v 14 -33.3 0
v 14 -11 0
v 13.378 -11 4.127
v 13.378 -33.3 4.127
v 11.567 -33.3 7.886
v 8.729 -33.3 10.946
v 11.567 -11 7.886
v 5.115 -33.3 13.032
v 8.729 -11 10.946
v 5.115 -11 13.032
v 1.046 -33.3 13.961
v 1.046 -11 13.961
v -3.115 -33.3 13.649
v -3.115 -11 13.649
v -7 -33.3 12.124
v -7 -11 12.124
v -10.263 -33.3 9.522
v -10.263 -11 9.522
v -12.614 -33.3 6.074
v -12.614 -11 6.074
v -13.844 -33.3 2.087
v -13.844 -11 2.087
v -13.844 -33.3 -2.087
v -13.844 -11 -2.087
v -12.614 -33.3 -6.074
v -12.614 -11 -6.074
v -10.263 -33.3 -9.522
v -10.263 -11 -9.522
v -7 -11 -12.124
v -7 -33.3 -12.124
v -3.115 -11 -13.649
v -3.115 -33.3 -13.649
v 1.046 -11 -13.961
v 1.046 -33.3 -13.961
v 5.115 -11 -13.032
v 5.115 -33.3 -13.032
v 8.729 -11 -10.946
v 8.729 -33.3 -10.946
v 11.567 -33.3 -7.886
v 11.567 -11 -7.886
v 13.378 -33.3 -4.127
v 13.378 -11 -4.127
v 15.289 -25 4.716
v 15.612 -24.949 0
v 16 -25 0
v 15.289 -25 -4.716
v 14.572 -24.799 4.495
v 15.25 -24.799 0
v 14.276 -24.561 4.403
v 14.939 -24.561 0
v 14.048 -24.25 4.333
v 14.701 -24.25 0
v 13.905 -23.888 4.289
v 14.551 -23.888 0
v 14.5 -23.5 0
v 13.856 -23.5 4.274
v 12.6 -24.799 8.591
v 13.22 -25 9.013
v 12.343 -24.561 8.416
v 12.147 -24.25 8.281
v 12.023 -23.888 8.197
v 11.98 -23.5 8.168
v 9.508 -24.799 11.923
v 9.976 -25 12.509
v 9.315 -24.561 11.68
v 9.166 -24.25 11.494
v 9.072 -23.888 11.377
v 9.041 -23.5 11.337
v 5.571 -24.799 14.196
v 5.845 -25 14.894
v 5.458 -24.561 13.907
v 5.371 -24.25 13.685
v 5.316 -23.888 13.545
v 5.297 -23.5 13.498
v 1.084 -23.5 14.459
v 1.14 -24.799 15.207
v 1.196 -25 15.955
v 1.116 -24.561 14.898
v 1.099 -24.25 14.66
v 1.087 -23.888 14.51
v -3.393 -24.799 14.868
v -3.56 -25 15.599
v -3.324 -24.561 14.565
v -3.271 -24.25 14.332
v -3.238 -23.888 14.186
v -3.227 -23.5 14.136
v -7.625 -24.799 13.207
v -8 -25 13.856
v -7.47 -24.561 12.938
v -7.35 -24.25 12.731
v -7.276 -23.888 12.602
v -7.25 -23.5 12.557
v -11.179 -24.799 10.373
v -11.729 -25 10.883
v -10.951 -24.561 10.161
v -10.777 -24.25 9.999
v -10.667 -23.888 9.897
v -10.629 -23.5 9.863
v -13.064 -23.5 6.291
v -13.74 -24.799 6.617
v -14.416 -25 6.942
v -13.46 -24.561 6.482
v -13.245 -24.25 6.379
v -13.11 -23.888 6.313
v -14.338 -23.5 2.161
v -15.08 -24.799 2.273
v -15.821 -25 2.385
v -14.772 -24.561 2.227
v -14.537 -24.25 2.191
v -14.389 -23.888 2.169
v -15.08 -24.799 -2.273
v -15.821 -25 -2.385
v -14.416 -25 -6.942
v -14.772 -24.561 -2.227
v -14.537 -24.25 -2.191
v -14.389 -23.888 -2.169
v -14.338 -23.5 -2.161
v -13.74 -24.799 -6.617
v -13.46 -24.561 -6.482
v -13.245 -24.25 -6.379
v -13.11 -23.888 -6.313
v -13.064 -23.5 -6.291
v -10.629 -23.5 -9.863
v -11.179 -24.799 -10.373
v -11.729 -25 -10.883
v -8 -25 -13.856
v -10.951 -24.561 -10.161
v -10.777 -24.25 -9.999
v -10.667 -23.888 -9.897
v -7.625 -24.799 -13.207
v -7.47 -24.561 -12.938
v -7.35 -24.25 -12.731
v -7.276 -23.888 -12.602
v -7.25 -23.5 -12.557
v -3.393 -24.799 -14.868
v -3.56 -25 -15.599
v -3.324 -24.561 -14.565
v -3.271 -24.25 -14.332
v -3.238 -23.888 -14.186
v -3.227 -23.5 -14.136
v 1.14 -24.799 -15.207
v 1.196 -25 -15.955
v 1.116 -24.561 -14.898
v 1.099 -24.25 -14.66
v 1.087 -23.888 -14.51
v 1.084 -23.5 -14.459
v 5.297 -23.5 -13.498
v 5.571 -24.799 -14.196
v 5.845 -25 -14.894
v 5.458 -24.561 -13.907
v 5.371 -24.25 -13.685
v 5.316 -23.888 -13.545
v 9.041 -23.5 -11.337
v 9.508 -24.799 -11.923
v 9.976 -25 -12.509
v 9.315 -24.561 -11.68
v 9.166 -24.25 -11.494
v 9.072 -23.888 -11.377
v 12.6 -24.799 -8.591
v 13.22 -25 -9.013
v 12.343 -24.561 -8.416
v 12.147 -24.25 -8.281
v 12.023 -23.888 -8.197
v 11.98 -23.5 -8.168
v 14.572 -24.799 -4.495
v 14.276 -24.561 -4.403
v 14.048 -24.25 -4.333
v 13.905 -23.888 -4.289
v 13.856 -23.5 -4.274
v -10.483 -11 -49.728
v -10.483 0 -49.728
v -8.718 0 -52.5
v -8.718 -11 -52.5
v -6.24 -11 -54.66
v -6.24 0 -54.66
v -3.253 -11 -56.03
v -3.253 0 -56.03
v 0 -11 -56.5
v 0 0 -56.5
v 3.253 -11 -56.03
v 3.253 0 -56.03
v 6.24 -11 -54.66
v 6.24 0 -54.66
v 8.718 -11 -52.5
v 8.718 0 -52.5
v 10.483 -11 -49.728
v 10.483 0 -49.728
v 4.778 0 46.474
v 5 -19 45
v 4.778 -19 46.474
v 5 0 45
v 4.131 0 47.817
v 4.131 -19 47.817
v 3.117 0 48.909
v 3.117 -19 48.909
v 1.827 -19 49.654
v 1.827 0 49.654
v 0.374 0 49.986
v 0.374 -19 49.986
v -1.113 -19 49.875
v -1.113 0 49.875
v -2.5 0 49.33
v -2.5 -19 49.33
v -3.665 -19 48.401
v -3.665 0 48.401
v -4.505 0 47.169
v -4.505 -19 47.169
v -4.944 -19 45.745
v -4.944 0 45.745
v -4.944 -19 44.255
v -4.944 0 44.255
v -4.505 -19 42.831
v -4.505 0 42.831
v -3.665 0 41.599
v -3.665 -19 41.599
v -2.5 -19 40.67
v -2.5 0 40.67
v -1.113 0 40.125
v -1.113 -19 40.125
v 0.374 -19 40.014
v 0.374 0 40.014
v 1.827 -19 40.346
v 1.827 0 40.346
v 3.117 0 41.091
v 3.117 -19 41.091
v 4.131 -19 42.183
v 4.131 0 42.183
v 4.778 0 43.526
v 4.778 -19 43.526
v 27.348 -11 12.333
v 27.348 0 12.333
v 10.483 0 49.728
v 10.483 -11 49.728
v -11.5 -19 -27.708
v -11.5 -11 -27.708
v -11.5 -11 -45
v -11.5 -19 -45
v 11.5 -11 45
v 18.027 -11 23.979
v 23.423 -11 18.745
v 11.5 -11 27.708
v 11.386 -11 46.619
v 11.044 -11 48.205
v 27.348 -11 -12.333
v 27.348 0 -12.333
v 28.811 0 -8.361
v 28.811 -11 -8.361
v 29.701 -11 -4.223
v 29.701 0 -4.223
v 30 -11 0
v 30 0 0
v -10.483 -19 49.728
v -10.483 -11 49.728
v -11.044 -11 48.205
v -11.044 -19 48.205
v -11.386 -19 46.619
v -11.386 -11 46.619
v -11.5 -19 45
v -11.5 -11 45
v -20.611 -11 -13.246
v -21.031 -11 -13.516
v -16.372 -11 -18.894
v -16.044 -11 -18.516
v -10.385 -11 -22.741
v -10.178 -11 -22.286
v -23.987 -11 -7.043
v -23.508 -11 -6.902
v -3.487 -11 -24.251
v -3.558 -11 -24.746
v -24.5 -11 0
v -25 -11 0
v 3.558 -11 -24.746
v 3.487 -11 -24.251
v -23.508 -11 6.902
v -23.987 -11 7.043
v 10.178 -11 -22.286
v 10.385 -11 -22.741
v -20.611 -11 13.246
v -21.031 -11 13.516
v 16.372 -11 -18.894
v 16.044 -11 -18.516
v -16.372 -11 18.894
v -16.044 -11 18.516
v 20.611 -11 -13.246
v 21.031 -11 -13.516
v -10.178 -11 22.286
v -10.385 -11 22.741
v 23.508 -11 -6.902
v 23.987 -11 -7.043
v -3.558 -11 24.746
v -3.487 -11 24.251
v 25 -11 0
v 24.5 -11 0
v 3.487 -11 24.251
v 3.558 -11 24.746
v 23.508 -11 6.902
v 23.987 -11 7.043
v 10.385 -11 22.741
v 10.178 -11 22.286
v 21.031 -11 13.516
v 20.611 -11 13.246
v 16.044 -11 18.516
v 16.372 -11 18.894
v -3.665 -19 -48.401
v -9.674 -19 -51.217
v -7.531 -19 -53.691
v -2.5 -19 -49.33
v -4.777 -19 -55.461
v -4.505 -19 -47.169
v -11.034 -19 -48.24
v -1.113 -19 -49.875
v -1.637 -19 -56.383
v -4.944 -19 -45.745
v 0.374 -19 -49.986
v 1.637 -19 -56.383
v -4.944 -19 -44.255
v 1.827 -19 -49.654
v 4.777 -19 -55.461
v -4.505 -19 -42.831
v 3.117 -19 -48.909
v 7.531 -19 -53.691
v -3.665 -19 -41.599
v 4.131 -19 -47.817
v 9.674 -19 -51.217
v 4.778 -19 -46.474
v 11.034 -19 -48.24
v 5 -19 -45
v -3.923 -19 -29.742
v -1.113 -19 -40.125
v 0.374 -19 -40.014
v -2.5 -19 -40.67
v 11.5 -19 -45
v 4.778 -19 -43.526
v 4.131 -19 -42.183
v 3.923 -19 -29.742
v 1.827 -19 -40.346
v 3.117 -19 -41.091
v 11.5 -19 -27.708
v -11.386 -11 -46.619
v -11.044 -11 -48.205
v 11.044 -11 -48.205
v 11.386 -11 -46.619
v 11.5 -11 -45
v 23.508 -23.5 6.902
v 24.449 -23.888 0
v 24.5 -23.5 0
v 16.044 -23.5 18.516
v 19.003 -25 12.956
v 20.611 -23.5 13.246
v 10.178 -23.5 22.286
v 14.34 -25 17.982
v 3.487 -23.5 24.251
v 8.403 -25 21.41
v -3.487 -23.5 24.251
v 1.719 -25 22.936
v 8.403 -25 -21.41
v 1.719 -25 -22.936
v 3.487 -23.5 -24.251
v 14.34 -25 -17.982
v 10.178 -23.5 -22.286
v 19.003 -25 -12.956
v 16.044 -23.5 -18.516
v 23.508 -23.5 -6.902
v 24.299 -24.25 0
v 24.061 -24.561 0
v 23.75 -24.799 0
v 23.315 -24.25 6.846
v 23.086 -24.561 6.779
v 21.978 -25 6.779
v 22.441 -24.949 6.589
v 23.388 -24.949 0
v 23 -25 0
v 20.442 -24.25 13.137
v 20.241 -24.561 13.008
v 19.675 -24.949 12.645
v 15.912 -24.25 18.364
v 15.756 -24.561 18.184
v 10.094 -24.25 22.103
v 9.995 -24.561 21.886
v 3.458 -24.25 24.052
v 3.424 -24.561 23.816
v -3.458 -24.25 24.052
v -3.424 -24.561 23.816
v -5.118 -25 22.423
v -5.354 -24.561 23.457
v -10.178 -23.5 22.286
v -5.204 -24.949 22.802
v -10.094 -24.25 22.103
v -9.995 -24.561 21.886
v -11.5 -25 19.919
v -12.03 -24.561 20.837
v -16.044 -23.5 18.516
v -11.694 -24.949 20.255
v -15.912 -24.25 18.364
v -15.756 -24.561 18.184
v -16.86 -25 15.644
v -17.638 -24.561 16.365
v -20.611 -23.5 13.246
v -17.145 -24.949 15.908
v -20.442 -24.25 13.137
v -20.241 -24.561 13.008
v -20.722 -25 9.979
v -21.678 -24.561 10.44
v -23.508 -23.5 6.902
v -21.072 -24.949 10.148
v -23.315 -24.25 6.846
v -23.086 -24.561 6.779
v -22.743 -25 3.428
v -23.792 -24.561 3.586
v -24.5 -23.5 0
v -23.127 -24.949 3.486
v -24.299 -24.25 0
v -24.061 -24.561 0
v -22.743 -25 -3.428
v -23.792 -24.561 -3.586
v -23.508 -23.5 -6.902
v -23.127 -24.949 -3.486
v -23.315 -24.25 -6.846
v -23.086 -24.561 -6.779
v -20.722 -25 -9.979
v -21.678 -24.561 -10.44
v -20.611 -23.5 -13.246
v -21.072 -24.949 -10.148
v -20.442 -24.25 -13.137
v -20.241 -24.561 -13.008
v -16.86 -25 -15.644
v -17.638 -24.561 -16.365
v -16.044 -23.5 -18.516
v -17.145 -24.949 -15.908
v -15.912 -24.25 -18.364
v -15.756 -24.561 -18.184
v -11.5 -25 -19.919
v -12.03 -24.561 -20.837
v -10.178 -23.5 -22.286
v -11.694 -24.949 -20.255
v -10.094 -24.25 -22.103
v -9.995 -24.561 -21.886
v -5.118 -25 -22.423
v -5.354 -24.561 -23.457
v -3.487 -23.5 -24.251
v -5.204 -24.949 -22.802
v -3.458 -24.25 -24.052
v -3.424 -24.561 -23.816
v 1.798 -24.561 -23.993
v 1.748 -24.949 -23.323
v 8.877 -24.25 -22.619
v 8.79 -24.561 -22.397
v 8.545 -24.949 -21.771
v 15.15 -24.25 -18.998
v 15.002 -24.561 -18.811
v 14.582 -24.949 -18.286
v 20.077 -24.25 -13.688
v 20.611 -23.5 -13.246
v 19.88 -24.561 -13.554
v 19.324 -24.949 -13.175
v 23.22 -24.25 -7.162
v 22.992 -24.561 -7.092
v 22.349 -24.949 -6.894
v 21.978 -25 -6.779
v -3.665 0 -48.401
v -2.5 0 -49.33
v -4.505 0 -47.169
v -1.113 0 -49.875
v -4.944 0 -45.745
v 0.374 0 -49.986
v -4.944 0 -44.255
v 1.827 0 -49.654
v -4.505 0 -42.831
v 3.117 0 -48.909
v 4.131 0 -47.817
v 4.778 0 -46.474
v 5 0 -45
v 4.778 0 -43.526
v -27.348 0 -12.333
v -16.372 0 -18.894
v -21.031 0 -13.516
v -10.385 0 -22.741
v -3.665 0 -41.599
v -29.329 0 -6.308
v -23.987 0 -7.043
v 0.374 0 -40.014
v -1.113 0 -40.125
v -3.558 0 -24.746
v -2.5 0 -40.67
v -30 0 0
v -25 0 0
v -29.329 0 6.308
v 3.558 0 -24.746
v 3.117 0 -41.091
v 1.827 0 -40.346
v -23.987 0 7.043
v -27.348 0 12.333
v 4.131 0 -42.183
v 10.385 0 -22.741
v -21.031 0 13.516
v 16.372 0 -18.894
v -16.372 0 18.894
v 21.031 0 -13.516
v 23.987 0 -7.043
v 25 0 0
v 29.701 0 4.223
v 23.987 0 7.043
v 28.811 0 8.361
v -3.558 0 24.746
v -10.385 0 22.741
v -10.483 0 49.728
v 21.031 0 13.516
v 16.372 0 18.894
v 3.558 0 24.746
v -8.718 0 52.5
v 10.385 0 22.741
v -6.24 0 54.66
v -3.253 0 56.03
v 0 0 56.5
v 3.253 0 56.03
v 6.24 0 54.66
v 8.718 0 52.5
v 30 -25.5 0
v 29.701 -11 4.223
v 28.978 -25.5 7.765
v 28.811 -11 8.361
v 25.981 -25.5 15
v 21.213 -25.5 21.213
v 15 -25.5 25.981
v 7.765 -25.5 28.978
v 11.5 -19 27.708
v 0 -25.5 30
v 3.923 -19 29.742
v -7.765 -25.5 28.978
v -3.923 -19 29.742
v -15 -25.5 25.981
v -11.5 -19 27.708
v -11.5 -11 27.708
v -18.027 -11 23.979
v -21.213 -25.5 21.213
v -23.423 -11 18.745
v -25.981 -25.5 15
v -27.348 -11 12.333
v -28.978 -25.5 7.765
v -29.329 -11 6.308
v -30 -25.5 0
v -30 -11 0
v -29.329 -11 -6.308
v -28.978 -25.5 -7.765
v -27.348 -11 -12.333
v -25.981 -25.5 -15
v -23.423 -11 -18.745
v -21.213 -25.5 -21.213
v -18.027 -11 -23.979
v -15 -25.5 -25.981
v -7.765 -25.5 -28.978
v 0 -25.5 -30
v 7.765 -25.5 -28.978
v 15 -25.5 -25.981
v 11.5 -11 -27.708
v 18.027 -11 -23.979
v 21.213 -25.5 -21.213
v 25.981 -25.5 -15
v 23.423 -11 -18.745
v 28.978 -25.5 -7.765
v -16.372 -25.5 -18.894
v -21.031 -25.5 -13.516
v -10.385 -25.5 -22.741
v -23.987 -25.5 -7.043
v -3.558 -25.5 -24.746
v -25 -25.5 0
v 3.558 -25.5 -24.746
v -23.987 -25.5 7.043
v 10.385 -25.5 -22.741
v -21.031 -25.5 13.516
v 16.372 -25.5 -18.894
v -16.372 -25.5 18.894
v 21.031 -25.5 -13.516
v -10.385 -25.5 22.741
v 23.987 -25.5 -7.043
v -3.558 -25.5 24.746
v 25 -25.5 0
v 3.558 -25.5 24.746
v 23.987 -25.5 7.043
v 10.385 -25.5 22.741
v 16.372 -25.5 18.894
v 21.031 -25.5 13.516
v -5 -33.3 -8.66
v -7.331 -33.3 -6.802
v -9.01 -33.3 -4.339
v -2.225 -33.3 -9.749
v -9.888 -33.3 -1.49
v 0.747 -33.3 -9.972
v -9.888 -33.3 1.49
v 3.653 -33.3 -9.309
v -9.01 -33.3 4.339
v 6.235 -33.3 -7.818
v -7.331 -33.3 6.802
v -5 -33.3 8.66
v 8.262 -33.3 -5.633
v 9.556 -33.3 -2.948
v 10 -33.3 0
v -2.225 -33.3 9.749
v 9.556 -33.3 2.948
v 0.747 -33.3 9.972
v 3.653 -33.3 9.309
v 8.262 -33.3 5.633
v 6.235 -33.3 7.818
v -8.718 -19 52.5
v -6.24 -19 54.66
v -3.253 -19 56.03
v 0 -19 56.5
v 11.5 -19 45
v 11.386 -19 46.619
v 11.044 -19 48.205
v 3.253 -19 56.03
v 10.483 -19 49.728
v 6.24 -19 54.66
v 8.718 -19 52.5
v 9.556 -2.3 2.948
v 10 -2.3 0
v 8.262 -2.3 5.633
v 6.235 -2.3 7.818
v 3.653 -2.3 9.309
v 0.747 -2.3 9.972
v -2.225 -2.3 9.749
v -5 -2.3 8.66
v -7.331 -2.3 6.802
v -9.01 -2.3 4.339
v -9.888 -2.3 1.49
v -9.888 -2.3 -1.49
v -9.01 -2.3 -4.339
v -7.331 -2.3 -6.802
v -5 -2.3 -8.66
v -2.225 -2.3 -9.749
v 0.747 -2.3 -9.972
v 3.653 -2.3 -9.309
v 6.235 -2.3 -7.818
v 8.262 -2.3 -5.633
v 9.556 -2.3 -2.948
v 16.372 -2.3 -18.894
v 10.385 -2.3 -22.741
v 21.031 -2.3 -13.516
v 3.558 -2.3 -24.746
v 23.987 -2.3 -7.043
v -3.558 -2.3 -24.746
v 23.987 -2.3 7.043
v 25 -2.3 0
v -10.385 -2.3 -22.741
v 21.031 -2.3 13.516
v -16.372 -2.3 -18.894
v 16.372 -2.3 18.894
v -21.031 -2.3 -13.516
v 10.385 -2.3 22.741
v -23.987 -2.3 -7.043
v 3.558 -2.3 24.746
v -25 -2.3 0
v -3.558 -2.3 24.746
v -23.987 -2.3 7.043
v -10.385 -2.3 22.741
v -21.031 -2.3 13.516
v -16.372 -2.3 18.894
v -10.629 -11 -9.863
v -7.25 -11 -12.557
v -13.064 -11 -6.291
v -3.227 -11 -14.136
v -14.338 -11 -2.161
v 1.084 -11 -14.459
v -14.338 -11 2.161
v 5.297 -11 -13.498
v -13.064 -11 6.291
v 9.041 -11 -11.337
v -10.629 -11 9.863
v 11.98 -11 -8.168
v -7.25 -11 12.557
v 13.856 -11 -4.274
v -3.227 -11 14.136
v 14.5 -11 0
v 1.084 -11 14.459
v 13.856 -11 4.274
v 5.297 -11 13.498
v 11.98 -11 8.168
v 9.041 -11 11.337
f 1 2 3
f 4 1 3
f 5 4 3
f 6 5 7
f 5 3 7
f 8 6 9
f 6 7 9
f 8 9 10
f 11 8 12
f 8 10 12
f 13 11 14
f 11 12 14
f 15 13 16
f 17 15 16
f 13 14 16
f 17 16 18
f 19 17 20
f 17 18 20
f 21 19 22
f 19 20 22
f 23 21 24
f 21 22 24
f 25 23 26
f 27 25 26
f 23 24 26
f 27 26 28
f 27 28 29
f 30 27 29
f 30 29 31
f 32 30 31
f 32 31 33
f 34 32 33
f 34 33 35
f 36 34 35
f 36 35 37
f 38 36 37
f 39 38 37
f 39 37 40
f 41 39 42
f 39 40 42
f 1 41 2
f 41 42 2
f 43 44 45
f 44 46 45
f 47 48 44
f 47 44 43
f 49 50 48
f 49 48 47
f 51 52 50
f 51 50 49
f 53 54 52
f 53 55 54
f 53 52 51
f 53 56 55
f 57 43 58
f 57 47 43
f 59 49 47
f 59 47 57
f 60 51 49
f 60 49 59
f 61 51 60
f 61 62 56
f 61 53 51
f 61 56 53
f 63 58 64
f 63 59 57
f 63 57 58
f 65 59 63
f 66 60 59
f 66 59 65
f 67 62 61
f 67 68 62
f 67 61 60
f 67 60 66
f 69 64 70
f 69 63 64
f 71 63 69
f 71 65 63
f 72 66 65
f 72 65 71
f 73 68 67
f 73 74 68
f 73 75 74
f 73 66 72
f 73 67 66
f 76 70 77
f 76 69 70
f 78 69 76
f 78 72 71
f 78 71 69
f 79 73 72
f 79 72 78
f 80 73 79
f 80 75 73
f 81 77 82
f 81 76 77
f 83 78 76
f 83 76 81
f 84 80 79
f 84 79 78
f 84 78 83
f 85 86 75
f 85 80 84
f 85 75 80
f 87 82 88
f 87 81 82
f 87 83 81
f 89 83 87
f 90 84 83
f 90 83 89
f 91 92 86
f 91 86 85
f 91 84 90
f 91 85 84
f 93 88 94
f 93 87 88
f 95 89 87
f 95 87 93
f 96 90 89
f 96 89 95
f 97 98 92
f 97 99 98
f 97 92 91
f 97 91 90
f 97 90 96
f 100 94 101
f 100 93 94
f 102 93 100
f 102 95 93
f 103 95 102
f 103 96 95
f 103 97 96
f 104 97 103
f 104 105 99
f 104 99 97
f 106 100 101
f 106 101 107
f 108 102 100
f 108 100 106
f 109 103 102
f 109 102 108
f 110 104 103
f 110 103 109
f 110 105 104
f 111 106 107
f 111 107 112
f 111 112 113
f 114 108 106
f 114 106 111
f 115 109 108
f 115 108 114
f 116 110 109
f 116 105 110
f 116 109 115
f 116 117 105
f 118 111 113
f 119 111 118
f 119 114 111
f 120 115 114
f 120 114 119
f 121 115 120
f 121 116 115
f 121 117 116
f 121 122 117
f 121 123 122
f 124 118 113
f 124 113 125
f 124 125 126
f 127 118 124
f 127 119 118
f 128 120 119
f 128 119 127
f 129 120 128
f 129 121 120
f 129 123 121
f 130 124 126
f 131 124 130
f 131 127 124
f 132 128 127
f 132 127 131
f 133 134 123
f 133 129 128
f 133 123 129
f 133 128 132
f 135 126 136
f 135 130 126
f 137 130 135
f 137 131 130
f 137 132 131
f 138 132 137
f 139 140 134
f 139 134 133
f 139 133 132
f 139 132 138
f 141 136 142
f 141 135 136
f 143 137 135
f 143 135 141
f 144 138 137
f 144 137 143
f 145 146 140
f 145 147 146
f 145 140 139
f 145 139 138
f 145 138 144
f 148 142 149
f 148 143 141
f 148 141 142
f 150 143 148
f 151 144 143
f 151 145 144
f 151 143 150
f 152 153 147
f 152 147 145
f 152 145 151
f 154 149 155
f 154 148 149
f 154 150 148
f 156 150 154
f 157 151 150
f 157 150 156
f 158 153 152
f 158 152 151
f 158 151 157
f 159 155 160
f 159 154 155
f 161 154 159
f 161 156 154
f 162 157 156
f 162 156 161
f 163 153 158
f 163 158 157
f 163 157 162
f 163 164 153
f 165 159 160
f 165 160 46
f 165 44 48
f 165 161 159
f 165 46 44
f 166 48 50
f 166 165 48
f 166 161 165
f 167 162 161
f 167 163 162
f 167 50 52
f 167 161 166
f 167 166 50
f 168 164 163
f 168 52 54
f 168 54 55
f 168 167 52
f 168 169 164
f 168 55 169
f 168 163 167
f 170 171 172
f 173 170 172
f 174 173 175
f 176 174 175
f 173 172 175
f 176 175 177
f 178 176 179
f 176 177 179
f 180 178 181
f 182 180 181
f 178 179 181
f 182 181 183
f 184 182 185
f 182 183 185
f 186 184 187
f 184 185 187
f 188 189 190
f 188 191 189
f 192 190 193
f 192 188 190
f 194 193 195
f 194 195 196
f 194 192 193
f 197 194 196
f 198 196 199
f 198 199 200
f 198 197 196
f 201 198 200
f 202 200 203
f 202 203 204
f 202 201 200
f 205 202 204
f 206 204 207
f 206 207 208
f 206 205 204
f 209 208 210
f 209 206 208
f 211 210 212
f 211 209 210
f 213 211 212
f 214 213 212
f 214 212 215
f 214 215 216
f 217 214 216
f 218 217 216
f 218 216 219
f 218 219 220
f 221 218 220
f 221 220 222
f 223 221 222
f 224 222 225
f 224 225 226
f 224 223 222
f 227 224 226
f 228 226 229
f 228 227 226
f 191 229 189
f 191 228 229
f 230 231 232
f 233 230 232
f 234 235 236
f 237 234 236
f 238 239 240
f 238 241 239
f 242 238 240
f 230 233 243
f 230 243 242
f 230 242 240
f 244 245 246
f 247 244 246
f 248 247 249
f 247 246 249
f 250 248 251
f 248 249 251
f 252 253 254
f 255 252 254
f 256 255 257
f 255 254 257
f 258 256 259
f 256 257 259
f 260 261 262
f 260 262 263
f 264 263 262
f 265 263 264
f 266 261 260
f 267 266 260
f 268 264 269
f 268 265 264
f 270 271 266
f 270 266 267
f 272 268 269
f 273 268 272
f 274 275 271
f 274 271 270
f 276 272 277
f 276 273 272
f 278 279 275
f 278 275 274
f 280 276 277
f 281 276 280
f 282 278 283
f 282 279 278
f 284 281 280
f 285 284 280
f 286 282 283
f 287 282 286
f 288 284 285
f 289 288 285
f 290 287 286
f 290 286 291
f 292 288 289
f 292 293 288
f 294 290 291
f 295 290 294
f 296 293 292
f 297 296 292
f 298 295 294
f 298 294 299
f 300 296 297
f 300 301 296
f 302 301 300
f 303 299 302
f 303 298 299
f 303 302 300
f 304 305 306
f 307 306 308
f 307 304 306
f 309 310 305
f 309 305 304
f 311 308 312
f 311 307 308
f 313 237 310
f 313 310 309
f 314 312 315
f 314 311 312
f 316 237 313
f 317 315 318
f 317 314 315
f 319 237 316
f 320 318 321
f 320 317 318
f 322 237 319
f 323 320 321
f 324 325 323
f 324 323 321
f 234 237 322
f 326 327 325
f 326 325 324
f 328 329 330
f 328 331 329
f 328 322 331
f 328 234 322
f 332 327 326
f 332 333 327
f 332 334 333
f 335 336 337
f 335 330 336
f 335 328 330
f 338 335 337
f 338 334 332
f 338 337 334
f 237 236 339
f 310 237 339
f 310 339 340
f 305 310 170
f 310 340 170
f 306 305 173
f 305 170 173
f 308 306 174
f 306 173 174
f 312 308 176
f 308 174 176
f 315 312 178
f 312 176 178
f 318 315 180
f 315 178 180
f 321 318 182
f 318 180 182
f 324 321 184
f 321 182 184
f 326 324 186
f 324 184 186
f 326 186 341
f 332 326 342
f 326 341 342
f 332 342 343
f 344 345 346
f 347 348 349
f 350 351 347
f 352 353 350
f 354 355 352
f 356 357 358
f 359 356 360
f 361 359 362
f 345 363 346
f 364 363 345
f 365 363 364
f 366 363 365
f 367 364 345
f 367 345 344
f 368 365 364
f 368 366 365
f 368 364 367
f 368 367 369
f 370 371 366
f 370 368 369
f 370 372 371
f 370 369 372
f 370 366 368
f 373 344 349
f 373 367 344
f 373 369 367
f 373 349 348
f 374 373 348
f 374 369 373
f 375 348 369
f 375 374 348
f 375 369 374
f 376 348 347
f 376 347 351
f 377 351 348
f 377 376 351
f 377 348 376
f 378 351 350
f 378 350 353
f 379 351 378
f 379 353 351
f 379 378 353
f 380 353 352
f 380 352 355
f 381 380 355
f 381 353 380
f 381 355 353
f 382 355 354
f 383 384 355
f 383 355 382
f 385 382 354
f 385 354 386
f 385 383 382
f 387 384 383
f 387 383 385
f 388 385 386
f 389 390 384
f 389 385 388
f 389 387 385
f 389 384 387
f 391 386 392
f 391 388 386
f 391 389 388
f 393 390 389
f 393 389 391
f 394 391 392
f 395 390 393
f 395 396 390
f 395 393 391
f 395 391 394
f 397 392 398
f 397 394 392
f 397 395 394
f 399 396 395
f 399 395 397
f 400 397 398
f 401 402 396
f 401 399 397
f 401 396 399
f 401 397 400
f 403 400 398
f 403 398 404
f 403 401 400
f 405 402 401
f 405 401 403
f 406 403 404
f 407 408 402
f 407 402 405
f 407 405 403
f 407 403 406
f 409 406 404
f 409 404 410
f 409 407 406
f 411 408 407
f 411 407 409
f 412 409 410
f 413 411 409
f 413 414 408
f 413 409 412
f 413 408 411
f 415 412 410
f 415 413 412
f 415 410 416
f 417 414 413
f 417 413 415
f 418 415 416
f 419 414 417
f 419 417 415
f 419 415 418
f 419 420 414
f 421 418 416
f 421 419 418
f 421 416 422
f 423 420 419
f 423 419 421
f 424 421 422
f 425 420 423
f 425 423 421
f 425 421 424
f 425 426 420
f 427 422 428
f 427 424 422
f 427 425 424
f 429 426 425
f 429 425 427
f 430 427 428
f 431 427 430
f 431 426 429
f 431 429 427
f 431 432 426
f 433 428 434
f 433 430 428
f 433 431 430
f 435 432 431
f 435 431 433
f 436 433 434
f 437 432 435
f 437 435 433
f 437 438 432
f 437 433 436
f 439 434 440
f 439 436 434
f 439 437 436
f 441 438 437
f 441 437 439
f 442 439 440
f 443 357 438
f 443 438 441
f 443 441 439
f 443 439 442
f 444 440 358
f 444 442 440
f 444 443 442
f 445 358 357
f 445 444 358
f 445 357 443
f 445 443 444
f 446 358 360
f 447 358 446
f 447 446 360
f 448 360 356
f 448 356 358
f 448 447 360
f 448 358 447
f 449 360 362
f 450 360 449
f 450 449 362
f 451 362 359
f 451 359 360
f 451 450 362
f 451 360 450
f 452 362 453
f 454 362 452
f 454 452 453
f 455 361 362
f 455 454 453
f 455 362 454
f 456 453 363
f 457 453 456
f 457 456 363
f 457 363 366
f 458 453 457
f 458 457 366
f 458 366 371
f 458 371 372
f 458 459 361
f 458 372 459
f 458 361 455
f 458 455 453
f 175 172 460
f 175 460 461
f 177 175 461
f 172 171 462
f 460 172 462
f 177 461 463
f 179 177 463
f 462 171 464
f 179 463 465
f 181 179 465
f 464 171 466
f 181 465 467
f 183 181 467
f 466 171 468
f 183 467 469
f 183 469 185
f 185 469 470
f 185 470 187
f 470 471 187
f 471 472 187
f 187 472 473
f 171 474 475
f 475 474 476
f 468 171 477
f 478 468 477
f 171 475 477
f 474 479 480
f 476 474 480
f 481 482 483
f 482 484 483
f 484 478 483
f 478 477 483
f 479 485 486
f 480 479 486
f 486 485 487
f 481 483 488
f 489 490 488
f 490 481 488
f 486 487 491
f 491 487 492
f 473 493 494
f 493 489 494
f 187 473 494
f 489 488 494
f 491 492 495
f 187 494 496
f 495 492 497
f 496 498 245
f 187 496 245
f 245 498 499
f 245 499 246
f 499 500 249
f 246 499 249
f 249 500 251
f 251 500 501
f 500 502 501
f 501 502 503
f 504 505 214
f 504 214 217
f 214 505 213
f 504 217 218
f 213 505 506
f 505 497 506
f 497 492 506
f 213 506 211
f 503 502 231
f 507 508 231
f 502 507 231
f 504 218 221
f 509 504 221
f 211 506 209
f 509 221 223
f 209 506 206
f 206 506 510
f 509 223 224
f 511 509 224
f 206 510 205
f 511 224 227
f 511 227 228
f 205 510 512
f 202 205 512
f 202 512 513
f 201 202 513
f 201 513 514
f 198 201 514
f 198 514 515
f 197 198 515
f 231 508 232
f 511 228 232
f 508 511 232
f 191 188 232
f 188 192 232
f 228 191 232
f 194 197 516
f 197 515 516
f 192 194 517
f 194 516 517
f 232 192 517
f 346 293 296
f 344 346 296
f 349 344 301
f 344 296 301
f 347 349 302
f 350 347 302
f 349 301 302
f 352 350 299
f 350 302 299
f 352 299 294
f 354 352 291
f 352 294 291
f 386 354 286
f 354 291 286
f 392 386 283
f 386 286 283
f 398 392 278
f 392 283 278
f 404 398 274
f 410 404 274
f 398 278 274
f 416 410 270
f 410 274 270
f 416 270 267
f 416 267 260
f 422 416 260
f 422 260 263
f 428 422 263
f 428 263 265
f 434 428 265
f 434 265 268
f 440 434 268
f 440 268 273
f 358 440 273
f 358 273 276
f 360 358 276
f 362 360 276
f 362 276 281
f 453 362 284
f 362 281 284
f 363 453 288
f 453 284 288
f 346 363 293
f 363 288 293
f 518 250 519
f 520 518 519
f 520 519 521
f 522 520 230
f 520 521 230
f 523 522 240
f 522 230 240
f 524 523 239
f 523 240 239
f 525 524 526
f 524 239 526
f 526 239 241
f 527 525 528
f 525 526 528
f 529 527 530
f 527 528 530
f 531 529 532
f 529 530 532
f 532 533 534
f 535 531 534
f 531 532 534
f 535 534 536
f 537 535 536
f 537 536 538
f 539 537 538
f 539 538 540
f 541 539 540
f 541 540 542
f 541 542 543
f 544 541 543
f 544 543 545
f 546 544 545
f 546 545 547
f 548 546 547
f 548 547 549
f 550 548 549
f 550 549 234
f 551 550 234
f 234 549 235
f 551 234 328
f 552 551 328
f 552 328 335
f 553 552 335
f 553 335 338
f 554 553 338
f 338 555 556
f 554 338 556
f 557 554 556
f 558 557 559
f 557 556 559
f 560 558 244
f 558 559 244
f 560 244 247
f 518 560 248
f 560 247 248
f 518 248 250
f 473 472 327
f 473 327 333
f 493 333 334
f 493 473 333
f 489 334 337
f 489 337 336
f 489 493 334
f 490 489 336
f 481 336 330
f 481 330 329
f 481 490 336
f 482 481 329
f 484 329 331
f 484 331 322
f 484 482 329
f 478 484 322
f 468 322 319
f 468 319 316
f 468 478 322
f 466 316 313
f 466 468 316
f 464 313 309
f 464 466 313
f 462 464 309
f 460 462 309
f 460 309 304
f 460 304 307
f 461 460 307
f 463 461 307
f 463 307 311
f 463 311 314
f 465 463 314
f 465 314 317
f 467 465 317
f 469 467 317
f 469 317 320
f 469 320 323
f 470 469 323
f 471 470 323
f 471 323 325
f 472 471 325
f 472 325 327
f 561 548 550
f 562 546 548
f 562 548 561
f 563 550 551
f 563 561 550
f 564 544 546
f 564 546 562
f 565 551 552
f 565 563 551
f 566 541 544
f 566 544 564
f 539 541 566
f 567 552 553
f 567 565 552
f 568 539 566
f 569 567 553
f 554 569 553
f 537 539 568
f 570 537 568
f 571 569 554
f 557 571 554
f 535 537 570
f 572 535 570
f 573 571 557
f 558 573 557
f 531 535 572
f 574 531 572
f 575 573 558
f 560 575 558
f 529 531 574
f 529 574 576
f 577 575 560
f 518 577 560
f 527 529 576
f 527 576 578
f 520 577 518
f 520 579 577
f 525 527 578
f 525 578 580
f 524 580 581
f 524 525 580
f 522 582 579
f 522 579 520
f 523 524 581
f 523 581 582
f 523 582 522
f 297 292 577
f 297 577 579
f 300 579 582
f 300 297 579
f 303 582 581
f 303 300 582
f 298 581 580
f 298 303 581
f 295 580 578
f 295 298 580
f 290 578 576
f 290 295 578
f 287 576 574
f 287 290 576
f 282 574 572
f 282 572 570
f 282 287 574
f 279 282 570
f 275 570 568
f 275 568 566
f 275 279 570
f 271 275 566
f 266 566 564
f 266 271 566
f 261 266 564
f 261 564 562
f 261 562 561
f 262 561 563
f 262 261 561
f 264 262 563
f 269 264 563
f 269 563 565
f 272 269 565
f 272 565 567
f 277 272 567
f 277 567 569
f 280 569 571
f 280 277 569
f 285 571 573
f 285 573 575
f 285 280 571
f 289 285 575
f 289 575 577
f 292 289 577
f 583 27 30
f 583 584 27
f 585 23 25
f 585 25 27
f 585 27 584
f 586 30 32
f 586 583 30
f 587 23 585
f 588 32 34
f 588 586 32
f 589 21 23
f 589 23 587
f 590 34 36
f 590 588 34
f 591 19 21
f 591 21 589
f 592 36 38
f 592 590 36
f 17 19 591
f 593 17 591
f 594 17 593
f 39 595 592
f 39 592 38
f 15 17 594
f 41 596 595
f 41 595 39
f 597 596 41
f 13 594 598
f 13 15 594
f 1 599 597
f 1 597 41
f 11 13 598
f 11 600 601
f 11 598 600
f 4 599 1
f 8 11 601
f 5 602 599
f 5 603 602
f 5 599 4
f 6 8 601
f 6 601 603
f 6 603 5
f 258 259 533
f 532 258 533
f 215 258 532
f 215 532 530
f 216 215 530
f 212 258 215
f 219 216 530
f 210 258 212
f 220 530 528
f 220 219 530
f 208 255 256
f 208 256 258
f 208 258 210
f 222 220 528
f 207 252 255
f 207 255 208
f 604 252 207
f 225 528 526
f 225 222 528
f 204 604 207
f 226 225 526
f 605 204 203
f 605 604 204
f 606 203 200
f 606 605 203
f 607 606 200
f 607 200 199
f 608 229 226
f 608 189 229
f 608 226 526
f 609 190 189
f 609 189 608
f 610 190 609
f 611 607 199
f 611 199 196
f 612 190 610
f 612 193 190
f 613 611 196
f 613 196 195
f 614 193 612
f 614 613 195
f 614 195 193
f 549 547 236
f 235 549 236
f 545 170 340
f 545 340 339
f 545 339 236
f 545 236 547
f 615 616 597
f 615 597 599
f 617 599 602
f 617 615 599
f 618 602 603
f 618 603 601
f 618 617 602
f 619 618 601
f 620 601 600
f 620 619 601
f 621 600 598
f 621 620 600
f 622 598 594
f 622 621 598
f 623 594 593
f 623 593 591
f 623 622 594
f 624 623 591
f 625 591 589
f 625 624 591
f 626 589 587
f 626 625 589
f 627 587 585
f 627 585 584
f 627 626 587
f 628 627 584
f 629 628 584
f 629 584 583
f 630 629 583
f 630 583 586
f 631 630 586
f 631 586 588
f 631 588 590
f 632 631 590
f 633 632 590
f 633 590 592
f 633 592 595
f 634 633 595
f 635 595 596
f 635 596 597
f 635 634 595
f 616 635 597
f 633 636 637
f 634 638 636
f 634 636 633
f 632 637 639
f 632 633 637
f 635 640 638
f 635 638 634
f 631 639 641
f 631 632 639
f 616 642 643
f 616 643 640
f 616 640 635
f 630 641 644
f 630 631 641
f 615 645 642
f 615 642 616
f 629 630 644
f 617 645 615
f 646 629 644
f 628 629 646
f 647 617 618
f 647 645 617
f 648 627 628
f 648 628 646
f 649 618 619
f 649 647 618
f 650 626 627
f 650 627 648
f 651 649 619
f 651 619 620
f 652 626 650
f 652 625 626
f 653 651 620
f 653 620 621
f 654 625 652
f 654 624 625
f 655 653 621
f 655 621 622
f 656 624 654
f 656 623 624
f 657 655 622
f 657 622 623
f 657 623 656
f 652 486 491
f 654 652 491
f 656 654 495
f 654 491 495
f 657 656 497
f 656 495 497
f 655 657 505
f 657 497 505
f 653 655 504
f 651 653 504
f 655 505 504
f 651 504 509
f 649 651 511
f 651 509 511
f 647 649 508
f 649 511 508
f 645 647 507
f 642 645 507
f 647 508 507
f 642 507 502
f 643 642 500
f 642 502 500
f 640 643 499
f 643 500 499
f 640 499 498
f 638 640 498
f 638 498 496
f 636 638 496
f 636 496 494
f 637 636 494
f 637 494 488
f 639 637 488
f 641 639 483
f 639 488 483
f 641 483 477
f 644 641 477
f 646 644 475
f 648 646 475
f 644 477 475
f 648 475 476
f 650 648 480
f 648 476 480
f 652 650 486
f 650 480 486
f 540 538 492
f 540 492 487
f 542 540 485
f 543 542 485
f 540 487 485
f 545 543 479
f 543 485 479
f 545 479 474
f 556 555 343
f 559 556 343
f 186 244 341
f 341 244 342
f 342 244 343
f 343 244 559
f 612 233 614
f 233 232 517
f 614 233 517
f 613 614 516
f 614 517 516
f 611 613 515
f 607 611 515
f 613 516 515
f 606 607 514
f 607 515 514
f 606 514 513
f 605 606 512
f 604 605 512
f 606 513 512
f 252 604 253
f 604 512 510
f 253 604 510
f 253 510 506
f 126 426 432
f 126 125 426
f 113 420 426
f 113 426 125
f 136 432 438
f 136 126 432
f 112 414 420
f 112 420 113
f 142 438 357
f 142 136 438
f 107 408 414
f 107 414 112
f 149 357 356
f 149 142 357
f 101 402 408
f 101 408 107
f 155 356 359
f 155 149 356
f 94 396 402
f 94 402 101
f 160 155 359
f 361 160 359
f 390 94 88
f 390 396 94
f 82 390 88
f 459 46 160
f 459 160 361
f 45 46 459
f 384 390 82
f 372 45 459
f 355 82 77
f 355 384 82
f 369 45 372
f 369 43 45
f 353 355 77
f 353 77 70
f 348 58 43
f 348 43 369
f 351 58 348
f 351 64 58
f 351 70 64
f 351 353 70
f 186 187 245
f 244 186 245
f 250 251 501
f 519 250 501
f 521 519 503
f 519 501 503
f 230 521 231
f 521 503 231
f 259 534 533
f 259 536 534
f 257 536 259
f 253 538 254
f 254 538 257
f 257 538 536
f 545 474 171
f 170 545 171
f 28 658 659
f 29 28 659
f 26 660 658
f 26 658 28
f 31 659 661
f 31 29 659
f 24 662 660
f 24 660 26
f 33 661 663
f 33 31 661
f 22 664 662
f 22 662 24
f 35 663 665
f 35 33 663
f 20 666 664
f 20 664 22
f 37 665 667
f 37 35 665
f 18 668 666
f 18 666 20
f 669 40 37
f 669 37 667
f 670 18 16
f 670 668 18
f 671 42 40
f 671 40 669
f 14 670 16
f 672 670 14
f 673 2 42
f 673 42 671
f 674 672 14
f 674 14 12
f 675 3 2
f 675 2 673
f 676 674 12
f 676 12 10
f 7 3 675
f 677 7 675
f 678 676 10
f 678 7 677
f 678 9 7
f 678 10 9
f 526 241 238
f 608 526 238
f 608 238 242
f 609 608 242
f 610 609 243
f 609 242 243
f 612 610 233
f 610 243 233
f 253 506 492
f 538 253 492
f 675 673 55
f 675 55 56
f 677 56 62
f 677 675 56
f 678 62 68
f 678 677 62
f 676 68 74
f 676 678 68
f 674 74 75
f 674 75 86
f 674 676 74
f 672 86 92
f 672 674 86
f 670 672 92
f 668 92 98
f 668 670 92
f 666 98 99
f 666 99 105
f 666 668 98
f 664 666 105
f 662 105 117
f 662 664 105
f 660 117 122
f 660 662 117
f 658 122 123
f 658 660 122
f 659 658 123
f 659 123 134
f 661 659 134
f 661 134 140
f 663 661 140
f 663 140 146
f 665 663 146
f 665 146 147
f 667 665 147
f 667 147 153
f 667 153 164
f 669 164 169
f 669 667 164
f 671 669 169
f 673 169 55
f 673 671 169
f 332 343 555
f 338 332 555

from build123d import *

# Parameters (mm, degrees)
F0_R      = 5
F0_R_2    = 10
F1_DEPTH  = 11
F2_R      = 14
F2_R_2    = 10
F3_DEPTH  = 22.3
F4_R      = 30
F4_R_2    = 25
F5_DEPTH  = 14.5
F6_R      = 5
F7_DEPTH  = 8
F8_R      = 25
F8_R_2    = 10
F9_DEPTH  = 2.3
F10_R     = 24.5
F10_R_2   = 14.5
F11_DEPTH = 14
F12_R     = 1.5


with BuildPart() as f1:
    # F0 (on Front) → F1 (new body)
    with BuildSketch(Plane.XZ):
        with BuildLine():
            ThreePointArc((-10.48323, 49.727778), (-2.417938, 33.757066), (11.5, 45))
            ThreePointArc((11.5, 45), (11.242934, 47.417938), (10.48323, 49.727778))
            ThreePointArc((10.48323, 49.727778), (0, 56.5), (-10.48323, 49.727778))
        make_face()
        with Locations((0, 45)):
            Circle(F0_R, mode=Mode.SUBTRACT)
        with BuildLine():
            ThreePointArc((10.48323, 49.727778), (11.242934, 47.417938), (11.5, 45))
            ThreePointArc((11.5, 45), (-2.417938, 33.757066), (-10.48323, 49.727778))
            Line((-10.48323, 49.727778), (-27.347557, 12.333333))
            ThreePointArc((-27.347557, 12.333333), (0, 30), (27.347557, 12.333333))
            Line((27.347557, 12.333333), (10.48323, 49.727778))
        make_face()
        with BuildLine():
            ThreePointArc((30, 0), (29.329394, 6.307665), (27.347557, 12.333333))
            ThreePointArc((27.347557, 12.333333), (0, 30), (-27.347557, 12.333333))
            ThreePointArc((-27.347557, 12.333333), (-30, 0), (-27.347557, -12.333333))
            ThreePointArc((-27.347557, -12.333333), (0, -30), (27.347557, -12.333333))
            ThreePointArc((27.347557, -12.333333), (29.329394, -6.307665), (30, 0))
        make_face()
        Circle(F0_R_2, mode=Mode.SUBTRACT)
        with BuildLine():
            ThreePointArc((27.347557, -12.333333), (0, -30), (-27.347557, -12.333333))
            Line((-27.347557, -12.333333), (-10.48323, -49.727778))
            ThreePointArc((-10.48323, -49.727778), (-2.417938, -33.757066), (11.5, -45))
            ThreePointArc((11.5, -45), (11.242934, -47.417938), (10.48323, -49.727778))
            Line((10.48323, -49.727778), (27.347557, -12.333333))
        make_face()
        with BuildLine():
            ThreePointArc((11.5, -45), (-2.417938, -33.757066), (-10.48323, -49.727778))
            ThreePointArc((-10.48323, -49.727778), (0, -56.5), (10.48323, -49.727778))
            ThreePointArc((10.48323, -49.727778), (11.242934, -47.417938), (11.5, -45))
        make_face()
        with Locations((0, -45)):
            Circle(F0_R, mode=Mode.SUBTRACT)
    extrude(amount=F1_DEPTH)

    # F2 (on face) → F3 (join)
    with BuildSketch(Plane.XZ.offset(11)):
        Circle(F2_R)
        Circle(F2_R_2, mode=Mode.SUBTRACT)
    extrude(amount=F3_DEPTH)

    # F4 (on face) → F5 (join)
    with BuildSketch(Plane.XZ.offset(11)):
        Circle(F4_R)
        Circle(F4_R_2, mode=Mode.SUBTRACT)
    extrude(amount=F5_DEPTH)

    # F6 (on face) → F7 (join)
    with BuildSketch(Plane.XZ.offset(11)):
        with BuildLine():
            ThreePointArc((-11.5, 45), (0, 33.5), (11.5, 45))
            ThreePointArc((11.5, 45), (11.242934, 47.417938), (10.48323, 49.727778))
            ThreePointArc((10.48323, 49.727778), (0, 56.5), (-10.48323, 49.727778))
            ThreePointArc((-10.48323, 49.727778), (-11.242934, 47.417938), (-11.5, 45))
        make_face()
        with Locations((0, 45)):
            Circle(F6_R, mode=Mode.SUBTRACT)
        with BuildLine():
            Line((11.5, 27.708302), (11.5, 45))
            ThreePointArc((11.5, 45), (0, 33.5), (-11.5, 45))
            Line((-11.5, 45), (-11.5, 27.708302))
            ThreePointArc((-11.5, 27.708302), (0, 30), (11.5, 27.708302))
        make_face()
        with BuildLine():
            ThreePointArc((11.5, -27.708302), (0, -30), (-11.5, -27.708302))
            Line((-11.5, -27.708302), (-11.5, -45))
            ThreePointArc((-11.5, -45), (0, -33.5), (11.5, -45))
            Line((11.5, -45), (11.5, -27.708302))
        make_face()
        with BuildLine():
            ThreePointArc((11.5, -45), (0, -33.5), (-11.5, -45))
            ThreePointArc((-11.5, -45), (0, -56.5), (11.5, -45))
        make_face()
        with Locations((0, -45)):
            Circle(F6_R, mode=Mode.SUBTRACT)
    extrude(amount=F7_DEPTH)

    # F8 (on face) → F9 (cut)
    with BuildSketch(Plane(origin=(0, 0, 0), x_dir=(-1, 0, 0), z_dir=(0, 1, 0))):
        Circle(F8_R)
        Circle(F8_R_2, mode=Mode.SUBTRACT)
    extrude(amount=-F9_DEPTH, mode=Mode.SUBTRACT)

    # F10 (on face) → F11 (join)
    with BuildSketch(Plane.XZ.offset(11)):
        Circle(F10_R)
        Circle(F10_R_2, mode=Mode.SUBTRACT)
    extrude(amount=F11_DEPTH)

    # F12
    f12_edges = [f1.edges().sort_by_distance(p)[0] for p in [
        (-24.5, -25, 0),
        (-14.5, -25, 0),
    ]]
    fillet(f12_edges, radius=F12_R)


solid = f1.part
